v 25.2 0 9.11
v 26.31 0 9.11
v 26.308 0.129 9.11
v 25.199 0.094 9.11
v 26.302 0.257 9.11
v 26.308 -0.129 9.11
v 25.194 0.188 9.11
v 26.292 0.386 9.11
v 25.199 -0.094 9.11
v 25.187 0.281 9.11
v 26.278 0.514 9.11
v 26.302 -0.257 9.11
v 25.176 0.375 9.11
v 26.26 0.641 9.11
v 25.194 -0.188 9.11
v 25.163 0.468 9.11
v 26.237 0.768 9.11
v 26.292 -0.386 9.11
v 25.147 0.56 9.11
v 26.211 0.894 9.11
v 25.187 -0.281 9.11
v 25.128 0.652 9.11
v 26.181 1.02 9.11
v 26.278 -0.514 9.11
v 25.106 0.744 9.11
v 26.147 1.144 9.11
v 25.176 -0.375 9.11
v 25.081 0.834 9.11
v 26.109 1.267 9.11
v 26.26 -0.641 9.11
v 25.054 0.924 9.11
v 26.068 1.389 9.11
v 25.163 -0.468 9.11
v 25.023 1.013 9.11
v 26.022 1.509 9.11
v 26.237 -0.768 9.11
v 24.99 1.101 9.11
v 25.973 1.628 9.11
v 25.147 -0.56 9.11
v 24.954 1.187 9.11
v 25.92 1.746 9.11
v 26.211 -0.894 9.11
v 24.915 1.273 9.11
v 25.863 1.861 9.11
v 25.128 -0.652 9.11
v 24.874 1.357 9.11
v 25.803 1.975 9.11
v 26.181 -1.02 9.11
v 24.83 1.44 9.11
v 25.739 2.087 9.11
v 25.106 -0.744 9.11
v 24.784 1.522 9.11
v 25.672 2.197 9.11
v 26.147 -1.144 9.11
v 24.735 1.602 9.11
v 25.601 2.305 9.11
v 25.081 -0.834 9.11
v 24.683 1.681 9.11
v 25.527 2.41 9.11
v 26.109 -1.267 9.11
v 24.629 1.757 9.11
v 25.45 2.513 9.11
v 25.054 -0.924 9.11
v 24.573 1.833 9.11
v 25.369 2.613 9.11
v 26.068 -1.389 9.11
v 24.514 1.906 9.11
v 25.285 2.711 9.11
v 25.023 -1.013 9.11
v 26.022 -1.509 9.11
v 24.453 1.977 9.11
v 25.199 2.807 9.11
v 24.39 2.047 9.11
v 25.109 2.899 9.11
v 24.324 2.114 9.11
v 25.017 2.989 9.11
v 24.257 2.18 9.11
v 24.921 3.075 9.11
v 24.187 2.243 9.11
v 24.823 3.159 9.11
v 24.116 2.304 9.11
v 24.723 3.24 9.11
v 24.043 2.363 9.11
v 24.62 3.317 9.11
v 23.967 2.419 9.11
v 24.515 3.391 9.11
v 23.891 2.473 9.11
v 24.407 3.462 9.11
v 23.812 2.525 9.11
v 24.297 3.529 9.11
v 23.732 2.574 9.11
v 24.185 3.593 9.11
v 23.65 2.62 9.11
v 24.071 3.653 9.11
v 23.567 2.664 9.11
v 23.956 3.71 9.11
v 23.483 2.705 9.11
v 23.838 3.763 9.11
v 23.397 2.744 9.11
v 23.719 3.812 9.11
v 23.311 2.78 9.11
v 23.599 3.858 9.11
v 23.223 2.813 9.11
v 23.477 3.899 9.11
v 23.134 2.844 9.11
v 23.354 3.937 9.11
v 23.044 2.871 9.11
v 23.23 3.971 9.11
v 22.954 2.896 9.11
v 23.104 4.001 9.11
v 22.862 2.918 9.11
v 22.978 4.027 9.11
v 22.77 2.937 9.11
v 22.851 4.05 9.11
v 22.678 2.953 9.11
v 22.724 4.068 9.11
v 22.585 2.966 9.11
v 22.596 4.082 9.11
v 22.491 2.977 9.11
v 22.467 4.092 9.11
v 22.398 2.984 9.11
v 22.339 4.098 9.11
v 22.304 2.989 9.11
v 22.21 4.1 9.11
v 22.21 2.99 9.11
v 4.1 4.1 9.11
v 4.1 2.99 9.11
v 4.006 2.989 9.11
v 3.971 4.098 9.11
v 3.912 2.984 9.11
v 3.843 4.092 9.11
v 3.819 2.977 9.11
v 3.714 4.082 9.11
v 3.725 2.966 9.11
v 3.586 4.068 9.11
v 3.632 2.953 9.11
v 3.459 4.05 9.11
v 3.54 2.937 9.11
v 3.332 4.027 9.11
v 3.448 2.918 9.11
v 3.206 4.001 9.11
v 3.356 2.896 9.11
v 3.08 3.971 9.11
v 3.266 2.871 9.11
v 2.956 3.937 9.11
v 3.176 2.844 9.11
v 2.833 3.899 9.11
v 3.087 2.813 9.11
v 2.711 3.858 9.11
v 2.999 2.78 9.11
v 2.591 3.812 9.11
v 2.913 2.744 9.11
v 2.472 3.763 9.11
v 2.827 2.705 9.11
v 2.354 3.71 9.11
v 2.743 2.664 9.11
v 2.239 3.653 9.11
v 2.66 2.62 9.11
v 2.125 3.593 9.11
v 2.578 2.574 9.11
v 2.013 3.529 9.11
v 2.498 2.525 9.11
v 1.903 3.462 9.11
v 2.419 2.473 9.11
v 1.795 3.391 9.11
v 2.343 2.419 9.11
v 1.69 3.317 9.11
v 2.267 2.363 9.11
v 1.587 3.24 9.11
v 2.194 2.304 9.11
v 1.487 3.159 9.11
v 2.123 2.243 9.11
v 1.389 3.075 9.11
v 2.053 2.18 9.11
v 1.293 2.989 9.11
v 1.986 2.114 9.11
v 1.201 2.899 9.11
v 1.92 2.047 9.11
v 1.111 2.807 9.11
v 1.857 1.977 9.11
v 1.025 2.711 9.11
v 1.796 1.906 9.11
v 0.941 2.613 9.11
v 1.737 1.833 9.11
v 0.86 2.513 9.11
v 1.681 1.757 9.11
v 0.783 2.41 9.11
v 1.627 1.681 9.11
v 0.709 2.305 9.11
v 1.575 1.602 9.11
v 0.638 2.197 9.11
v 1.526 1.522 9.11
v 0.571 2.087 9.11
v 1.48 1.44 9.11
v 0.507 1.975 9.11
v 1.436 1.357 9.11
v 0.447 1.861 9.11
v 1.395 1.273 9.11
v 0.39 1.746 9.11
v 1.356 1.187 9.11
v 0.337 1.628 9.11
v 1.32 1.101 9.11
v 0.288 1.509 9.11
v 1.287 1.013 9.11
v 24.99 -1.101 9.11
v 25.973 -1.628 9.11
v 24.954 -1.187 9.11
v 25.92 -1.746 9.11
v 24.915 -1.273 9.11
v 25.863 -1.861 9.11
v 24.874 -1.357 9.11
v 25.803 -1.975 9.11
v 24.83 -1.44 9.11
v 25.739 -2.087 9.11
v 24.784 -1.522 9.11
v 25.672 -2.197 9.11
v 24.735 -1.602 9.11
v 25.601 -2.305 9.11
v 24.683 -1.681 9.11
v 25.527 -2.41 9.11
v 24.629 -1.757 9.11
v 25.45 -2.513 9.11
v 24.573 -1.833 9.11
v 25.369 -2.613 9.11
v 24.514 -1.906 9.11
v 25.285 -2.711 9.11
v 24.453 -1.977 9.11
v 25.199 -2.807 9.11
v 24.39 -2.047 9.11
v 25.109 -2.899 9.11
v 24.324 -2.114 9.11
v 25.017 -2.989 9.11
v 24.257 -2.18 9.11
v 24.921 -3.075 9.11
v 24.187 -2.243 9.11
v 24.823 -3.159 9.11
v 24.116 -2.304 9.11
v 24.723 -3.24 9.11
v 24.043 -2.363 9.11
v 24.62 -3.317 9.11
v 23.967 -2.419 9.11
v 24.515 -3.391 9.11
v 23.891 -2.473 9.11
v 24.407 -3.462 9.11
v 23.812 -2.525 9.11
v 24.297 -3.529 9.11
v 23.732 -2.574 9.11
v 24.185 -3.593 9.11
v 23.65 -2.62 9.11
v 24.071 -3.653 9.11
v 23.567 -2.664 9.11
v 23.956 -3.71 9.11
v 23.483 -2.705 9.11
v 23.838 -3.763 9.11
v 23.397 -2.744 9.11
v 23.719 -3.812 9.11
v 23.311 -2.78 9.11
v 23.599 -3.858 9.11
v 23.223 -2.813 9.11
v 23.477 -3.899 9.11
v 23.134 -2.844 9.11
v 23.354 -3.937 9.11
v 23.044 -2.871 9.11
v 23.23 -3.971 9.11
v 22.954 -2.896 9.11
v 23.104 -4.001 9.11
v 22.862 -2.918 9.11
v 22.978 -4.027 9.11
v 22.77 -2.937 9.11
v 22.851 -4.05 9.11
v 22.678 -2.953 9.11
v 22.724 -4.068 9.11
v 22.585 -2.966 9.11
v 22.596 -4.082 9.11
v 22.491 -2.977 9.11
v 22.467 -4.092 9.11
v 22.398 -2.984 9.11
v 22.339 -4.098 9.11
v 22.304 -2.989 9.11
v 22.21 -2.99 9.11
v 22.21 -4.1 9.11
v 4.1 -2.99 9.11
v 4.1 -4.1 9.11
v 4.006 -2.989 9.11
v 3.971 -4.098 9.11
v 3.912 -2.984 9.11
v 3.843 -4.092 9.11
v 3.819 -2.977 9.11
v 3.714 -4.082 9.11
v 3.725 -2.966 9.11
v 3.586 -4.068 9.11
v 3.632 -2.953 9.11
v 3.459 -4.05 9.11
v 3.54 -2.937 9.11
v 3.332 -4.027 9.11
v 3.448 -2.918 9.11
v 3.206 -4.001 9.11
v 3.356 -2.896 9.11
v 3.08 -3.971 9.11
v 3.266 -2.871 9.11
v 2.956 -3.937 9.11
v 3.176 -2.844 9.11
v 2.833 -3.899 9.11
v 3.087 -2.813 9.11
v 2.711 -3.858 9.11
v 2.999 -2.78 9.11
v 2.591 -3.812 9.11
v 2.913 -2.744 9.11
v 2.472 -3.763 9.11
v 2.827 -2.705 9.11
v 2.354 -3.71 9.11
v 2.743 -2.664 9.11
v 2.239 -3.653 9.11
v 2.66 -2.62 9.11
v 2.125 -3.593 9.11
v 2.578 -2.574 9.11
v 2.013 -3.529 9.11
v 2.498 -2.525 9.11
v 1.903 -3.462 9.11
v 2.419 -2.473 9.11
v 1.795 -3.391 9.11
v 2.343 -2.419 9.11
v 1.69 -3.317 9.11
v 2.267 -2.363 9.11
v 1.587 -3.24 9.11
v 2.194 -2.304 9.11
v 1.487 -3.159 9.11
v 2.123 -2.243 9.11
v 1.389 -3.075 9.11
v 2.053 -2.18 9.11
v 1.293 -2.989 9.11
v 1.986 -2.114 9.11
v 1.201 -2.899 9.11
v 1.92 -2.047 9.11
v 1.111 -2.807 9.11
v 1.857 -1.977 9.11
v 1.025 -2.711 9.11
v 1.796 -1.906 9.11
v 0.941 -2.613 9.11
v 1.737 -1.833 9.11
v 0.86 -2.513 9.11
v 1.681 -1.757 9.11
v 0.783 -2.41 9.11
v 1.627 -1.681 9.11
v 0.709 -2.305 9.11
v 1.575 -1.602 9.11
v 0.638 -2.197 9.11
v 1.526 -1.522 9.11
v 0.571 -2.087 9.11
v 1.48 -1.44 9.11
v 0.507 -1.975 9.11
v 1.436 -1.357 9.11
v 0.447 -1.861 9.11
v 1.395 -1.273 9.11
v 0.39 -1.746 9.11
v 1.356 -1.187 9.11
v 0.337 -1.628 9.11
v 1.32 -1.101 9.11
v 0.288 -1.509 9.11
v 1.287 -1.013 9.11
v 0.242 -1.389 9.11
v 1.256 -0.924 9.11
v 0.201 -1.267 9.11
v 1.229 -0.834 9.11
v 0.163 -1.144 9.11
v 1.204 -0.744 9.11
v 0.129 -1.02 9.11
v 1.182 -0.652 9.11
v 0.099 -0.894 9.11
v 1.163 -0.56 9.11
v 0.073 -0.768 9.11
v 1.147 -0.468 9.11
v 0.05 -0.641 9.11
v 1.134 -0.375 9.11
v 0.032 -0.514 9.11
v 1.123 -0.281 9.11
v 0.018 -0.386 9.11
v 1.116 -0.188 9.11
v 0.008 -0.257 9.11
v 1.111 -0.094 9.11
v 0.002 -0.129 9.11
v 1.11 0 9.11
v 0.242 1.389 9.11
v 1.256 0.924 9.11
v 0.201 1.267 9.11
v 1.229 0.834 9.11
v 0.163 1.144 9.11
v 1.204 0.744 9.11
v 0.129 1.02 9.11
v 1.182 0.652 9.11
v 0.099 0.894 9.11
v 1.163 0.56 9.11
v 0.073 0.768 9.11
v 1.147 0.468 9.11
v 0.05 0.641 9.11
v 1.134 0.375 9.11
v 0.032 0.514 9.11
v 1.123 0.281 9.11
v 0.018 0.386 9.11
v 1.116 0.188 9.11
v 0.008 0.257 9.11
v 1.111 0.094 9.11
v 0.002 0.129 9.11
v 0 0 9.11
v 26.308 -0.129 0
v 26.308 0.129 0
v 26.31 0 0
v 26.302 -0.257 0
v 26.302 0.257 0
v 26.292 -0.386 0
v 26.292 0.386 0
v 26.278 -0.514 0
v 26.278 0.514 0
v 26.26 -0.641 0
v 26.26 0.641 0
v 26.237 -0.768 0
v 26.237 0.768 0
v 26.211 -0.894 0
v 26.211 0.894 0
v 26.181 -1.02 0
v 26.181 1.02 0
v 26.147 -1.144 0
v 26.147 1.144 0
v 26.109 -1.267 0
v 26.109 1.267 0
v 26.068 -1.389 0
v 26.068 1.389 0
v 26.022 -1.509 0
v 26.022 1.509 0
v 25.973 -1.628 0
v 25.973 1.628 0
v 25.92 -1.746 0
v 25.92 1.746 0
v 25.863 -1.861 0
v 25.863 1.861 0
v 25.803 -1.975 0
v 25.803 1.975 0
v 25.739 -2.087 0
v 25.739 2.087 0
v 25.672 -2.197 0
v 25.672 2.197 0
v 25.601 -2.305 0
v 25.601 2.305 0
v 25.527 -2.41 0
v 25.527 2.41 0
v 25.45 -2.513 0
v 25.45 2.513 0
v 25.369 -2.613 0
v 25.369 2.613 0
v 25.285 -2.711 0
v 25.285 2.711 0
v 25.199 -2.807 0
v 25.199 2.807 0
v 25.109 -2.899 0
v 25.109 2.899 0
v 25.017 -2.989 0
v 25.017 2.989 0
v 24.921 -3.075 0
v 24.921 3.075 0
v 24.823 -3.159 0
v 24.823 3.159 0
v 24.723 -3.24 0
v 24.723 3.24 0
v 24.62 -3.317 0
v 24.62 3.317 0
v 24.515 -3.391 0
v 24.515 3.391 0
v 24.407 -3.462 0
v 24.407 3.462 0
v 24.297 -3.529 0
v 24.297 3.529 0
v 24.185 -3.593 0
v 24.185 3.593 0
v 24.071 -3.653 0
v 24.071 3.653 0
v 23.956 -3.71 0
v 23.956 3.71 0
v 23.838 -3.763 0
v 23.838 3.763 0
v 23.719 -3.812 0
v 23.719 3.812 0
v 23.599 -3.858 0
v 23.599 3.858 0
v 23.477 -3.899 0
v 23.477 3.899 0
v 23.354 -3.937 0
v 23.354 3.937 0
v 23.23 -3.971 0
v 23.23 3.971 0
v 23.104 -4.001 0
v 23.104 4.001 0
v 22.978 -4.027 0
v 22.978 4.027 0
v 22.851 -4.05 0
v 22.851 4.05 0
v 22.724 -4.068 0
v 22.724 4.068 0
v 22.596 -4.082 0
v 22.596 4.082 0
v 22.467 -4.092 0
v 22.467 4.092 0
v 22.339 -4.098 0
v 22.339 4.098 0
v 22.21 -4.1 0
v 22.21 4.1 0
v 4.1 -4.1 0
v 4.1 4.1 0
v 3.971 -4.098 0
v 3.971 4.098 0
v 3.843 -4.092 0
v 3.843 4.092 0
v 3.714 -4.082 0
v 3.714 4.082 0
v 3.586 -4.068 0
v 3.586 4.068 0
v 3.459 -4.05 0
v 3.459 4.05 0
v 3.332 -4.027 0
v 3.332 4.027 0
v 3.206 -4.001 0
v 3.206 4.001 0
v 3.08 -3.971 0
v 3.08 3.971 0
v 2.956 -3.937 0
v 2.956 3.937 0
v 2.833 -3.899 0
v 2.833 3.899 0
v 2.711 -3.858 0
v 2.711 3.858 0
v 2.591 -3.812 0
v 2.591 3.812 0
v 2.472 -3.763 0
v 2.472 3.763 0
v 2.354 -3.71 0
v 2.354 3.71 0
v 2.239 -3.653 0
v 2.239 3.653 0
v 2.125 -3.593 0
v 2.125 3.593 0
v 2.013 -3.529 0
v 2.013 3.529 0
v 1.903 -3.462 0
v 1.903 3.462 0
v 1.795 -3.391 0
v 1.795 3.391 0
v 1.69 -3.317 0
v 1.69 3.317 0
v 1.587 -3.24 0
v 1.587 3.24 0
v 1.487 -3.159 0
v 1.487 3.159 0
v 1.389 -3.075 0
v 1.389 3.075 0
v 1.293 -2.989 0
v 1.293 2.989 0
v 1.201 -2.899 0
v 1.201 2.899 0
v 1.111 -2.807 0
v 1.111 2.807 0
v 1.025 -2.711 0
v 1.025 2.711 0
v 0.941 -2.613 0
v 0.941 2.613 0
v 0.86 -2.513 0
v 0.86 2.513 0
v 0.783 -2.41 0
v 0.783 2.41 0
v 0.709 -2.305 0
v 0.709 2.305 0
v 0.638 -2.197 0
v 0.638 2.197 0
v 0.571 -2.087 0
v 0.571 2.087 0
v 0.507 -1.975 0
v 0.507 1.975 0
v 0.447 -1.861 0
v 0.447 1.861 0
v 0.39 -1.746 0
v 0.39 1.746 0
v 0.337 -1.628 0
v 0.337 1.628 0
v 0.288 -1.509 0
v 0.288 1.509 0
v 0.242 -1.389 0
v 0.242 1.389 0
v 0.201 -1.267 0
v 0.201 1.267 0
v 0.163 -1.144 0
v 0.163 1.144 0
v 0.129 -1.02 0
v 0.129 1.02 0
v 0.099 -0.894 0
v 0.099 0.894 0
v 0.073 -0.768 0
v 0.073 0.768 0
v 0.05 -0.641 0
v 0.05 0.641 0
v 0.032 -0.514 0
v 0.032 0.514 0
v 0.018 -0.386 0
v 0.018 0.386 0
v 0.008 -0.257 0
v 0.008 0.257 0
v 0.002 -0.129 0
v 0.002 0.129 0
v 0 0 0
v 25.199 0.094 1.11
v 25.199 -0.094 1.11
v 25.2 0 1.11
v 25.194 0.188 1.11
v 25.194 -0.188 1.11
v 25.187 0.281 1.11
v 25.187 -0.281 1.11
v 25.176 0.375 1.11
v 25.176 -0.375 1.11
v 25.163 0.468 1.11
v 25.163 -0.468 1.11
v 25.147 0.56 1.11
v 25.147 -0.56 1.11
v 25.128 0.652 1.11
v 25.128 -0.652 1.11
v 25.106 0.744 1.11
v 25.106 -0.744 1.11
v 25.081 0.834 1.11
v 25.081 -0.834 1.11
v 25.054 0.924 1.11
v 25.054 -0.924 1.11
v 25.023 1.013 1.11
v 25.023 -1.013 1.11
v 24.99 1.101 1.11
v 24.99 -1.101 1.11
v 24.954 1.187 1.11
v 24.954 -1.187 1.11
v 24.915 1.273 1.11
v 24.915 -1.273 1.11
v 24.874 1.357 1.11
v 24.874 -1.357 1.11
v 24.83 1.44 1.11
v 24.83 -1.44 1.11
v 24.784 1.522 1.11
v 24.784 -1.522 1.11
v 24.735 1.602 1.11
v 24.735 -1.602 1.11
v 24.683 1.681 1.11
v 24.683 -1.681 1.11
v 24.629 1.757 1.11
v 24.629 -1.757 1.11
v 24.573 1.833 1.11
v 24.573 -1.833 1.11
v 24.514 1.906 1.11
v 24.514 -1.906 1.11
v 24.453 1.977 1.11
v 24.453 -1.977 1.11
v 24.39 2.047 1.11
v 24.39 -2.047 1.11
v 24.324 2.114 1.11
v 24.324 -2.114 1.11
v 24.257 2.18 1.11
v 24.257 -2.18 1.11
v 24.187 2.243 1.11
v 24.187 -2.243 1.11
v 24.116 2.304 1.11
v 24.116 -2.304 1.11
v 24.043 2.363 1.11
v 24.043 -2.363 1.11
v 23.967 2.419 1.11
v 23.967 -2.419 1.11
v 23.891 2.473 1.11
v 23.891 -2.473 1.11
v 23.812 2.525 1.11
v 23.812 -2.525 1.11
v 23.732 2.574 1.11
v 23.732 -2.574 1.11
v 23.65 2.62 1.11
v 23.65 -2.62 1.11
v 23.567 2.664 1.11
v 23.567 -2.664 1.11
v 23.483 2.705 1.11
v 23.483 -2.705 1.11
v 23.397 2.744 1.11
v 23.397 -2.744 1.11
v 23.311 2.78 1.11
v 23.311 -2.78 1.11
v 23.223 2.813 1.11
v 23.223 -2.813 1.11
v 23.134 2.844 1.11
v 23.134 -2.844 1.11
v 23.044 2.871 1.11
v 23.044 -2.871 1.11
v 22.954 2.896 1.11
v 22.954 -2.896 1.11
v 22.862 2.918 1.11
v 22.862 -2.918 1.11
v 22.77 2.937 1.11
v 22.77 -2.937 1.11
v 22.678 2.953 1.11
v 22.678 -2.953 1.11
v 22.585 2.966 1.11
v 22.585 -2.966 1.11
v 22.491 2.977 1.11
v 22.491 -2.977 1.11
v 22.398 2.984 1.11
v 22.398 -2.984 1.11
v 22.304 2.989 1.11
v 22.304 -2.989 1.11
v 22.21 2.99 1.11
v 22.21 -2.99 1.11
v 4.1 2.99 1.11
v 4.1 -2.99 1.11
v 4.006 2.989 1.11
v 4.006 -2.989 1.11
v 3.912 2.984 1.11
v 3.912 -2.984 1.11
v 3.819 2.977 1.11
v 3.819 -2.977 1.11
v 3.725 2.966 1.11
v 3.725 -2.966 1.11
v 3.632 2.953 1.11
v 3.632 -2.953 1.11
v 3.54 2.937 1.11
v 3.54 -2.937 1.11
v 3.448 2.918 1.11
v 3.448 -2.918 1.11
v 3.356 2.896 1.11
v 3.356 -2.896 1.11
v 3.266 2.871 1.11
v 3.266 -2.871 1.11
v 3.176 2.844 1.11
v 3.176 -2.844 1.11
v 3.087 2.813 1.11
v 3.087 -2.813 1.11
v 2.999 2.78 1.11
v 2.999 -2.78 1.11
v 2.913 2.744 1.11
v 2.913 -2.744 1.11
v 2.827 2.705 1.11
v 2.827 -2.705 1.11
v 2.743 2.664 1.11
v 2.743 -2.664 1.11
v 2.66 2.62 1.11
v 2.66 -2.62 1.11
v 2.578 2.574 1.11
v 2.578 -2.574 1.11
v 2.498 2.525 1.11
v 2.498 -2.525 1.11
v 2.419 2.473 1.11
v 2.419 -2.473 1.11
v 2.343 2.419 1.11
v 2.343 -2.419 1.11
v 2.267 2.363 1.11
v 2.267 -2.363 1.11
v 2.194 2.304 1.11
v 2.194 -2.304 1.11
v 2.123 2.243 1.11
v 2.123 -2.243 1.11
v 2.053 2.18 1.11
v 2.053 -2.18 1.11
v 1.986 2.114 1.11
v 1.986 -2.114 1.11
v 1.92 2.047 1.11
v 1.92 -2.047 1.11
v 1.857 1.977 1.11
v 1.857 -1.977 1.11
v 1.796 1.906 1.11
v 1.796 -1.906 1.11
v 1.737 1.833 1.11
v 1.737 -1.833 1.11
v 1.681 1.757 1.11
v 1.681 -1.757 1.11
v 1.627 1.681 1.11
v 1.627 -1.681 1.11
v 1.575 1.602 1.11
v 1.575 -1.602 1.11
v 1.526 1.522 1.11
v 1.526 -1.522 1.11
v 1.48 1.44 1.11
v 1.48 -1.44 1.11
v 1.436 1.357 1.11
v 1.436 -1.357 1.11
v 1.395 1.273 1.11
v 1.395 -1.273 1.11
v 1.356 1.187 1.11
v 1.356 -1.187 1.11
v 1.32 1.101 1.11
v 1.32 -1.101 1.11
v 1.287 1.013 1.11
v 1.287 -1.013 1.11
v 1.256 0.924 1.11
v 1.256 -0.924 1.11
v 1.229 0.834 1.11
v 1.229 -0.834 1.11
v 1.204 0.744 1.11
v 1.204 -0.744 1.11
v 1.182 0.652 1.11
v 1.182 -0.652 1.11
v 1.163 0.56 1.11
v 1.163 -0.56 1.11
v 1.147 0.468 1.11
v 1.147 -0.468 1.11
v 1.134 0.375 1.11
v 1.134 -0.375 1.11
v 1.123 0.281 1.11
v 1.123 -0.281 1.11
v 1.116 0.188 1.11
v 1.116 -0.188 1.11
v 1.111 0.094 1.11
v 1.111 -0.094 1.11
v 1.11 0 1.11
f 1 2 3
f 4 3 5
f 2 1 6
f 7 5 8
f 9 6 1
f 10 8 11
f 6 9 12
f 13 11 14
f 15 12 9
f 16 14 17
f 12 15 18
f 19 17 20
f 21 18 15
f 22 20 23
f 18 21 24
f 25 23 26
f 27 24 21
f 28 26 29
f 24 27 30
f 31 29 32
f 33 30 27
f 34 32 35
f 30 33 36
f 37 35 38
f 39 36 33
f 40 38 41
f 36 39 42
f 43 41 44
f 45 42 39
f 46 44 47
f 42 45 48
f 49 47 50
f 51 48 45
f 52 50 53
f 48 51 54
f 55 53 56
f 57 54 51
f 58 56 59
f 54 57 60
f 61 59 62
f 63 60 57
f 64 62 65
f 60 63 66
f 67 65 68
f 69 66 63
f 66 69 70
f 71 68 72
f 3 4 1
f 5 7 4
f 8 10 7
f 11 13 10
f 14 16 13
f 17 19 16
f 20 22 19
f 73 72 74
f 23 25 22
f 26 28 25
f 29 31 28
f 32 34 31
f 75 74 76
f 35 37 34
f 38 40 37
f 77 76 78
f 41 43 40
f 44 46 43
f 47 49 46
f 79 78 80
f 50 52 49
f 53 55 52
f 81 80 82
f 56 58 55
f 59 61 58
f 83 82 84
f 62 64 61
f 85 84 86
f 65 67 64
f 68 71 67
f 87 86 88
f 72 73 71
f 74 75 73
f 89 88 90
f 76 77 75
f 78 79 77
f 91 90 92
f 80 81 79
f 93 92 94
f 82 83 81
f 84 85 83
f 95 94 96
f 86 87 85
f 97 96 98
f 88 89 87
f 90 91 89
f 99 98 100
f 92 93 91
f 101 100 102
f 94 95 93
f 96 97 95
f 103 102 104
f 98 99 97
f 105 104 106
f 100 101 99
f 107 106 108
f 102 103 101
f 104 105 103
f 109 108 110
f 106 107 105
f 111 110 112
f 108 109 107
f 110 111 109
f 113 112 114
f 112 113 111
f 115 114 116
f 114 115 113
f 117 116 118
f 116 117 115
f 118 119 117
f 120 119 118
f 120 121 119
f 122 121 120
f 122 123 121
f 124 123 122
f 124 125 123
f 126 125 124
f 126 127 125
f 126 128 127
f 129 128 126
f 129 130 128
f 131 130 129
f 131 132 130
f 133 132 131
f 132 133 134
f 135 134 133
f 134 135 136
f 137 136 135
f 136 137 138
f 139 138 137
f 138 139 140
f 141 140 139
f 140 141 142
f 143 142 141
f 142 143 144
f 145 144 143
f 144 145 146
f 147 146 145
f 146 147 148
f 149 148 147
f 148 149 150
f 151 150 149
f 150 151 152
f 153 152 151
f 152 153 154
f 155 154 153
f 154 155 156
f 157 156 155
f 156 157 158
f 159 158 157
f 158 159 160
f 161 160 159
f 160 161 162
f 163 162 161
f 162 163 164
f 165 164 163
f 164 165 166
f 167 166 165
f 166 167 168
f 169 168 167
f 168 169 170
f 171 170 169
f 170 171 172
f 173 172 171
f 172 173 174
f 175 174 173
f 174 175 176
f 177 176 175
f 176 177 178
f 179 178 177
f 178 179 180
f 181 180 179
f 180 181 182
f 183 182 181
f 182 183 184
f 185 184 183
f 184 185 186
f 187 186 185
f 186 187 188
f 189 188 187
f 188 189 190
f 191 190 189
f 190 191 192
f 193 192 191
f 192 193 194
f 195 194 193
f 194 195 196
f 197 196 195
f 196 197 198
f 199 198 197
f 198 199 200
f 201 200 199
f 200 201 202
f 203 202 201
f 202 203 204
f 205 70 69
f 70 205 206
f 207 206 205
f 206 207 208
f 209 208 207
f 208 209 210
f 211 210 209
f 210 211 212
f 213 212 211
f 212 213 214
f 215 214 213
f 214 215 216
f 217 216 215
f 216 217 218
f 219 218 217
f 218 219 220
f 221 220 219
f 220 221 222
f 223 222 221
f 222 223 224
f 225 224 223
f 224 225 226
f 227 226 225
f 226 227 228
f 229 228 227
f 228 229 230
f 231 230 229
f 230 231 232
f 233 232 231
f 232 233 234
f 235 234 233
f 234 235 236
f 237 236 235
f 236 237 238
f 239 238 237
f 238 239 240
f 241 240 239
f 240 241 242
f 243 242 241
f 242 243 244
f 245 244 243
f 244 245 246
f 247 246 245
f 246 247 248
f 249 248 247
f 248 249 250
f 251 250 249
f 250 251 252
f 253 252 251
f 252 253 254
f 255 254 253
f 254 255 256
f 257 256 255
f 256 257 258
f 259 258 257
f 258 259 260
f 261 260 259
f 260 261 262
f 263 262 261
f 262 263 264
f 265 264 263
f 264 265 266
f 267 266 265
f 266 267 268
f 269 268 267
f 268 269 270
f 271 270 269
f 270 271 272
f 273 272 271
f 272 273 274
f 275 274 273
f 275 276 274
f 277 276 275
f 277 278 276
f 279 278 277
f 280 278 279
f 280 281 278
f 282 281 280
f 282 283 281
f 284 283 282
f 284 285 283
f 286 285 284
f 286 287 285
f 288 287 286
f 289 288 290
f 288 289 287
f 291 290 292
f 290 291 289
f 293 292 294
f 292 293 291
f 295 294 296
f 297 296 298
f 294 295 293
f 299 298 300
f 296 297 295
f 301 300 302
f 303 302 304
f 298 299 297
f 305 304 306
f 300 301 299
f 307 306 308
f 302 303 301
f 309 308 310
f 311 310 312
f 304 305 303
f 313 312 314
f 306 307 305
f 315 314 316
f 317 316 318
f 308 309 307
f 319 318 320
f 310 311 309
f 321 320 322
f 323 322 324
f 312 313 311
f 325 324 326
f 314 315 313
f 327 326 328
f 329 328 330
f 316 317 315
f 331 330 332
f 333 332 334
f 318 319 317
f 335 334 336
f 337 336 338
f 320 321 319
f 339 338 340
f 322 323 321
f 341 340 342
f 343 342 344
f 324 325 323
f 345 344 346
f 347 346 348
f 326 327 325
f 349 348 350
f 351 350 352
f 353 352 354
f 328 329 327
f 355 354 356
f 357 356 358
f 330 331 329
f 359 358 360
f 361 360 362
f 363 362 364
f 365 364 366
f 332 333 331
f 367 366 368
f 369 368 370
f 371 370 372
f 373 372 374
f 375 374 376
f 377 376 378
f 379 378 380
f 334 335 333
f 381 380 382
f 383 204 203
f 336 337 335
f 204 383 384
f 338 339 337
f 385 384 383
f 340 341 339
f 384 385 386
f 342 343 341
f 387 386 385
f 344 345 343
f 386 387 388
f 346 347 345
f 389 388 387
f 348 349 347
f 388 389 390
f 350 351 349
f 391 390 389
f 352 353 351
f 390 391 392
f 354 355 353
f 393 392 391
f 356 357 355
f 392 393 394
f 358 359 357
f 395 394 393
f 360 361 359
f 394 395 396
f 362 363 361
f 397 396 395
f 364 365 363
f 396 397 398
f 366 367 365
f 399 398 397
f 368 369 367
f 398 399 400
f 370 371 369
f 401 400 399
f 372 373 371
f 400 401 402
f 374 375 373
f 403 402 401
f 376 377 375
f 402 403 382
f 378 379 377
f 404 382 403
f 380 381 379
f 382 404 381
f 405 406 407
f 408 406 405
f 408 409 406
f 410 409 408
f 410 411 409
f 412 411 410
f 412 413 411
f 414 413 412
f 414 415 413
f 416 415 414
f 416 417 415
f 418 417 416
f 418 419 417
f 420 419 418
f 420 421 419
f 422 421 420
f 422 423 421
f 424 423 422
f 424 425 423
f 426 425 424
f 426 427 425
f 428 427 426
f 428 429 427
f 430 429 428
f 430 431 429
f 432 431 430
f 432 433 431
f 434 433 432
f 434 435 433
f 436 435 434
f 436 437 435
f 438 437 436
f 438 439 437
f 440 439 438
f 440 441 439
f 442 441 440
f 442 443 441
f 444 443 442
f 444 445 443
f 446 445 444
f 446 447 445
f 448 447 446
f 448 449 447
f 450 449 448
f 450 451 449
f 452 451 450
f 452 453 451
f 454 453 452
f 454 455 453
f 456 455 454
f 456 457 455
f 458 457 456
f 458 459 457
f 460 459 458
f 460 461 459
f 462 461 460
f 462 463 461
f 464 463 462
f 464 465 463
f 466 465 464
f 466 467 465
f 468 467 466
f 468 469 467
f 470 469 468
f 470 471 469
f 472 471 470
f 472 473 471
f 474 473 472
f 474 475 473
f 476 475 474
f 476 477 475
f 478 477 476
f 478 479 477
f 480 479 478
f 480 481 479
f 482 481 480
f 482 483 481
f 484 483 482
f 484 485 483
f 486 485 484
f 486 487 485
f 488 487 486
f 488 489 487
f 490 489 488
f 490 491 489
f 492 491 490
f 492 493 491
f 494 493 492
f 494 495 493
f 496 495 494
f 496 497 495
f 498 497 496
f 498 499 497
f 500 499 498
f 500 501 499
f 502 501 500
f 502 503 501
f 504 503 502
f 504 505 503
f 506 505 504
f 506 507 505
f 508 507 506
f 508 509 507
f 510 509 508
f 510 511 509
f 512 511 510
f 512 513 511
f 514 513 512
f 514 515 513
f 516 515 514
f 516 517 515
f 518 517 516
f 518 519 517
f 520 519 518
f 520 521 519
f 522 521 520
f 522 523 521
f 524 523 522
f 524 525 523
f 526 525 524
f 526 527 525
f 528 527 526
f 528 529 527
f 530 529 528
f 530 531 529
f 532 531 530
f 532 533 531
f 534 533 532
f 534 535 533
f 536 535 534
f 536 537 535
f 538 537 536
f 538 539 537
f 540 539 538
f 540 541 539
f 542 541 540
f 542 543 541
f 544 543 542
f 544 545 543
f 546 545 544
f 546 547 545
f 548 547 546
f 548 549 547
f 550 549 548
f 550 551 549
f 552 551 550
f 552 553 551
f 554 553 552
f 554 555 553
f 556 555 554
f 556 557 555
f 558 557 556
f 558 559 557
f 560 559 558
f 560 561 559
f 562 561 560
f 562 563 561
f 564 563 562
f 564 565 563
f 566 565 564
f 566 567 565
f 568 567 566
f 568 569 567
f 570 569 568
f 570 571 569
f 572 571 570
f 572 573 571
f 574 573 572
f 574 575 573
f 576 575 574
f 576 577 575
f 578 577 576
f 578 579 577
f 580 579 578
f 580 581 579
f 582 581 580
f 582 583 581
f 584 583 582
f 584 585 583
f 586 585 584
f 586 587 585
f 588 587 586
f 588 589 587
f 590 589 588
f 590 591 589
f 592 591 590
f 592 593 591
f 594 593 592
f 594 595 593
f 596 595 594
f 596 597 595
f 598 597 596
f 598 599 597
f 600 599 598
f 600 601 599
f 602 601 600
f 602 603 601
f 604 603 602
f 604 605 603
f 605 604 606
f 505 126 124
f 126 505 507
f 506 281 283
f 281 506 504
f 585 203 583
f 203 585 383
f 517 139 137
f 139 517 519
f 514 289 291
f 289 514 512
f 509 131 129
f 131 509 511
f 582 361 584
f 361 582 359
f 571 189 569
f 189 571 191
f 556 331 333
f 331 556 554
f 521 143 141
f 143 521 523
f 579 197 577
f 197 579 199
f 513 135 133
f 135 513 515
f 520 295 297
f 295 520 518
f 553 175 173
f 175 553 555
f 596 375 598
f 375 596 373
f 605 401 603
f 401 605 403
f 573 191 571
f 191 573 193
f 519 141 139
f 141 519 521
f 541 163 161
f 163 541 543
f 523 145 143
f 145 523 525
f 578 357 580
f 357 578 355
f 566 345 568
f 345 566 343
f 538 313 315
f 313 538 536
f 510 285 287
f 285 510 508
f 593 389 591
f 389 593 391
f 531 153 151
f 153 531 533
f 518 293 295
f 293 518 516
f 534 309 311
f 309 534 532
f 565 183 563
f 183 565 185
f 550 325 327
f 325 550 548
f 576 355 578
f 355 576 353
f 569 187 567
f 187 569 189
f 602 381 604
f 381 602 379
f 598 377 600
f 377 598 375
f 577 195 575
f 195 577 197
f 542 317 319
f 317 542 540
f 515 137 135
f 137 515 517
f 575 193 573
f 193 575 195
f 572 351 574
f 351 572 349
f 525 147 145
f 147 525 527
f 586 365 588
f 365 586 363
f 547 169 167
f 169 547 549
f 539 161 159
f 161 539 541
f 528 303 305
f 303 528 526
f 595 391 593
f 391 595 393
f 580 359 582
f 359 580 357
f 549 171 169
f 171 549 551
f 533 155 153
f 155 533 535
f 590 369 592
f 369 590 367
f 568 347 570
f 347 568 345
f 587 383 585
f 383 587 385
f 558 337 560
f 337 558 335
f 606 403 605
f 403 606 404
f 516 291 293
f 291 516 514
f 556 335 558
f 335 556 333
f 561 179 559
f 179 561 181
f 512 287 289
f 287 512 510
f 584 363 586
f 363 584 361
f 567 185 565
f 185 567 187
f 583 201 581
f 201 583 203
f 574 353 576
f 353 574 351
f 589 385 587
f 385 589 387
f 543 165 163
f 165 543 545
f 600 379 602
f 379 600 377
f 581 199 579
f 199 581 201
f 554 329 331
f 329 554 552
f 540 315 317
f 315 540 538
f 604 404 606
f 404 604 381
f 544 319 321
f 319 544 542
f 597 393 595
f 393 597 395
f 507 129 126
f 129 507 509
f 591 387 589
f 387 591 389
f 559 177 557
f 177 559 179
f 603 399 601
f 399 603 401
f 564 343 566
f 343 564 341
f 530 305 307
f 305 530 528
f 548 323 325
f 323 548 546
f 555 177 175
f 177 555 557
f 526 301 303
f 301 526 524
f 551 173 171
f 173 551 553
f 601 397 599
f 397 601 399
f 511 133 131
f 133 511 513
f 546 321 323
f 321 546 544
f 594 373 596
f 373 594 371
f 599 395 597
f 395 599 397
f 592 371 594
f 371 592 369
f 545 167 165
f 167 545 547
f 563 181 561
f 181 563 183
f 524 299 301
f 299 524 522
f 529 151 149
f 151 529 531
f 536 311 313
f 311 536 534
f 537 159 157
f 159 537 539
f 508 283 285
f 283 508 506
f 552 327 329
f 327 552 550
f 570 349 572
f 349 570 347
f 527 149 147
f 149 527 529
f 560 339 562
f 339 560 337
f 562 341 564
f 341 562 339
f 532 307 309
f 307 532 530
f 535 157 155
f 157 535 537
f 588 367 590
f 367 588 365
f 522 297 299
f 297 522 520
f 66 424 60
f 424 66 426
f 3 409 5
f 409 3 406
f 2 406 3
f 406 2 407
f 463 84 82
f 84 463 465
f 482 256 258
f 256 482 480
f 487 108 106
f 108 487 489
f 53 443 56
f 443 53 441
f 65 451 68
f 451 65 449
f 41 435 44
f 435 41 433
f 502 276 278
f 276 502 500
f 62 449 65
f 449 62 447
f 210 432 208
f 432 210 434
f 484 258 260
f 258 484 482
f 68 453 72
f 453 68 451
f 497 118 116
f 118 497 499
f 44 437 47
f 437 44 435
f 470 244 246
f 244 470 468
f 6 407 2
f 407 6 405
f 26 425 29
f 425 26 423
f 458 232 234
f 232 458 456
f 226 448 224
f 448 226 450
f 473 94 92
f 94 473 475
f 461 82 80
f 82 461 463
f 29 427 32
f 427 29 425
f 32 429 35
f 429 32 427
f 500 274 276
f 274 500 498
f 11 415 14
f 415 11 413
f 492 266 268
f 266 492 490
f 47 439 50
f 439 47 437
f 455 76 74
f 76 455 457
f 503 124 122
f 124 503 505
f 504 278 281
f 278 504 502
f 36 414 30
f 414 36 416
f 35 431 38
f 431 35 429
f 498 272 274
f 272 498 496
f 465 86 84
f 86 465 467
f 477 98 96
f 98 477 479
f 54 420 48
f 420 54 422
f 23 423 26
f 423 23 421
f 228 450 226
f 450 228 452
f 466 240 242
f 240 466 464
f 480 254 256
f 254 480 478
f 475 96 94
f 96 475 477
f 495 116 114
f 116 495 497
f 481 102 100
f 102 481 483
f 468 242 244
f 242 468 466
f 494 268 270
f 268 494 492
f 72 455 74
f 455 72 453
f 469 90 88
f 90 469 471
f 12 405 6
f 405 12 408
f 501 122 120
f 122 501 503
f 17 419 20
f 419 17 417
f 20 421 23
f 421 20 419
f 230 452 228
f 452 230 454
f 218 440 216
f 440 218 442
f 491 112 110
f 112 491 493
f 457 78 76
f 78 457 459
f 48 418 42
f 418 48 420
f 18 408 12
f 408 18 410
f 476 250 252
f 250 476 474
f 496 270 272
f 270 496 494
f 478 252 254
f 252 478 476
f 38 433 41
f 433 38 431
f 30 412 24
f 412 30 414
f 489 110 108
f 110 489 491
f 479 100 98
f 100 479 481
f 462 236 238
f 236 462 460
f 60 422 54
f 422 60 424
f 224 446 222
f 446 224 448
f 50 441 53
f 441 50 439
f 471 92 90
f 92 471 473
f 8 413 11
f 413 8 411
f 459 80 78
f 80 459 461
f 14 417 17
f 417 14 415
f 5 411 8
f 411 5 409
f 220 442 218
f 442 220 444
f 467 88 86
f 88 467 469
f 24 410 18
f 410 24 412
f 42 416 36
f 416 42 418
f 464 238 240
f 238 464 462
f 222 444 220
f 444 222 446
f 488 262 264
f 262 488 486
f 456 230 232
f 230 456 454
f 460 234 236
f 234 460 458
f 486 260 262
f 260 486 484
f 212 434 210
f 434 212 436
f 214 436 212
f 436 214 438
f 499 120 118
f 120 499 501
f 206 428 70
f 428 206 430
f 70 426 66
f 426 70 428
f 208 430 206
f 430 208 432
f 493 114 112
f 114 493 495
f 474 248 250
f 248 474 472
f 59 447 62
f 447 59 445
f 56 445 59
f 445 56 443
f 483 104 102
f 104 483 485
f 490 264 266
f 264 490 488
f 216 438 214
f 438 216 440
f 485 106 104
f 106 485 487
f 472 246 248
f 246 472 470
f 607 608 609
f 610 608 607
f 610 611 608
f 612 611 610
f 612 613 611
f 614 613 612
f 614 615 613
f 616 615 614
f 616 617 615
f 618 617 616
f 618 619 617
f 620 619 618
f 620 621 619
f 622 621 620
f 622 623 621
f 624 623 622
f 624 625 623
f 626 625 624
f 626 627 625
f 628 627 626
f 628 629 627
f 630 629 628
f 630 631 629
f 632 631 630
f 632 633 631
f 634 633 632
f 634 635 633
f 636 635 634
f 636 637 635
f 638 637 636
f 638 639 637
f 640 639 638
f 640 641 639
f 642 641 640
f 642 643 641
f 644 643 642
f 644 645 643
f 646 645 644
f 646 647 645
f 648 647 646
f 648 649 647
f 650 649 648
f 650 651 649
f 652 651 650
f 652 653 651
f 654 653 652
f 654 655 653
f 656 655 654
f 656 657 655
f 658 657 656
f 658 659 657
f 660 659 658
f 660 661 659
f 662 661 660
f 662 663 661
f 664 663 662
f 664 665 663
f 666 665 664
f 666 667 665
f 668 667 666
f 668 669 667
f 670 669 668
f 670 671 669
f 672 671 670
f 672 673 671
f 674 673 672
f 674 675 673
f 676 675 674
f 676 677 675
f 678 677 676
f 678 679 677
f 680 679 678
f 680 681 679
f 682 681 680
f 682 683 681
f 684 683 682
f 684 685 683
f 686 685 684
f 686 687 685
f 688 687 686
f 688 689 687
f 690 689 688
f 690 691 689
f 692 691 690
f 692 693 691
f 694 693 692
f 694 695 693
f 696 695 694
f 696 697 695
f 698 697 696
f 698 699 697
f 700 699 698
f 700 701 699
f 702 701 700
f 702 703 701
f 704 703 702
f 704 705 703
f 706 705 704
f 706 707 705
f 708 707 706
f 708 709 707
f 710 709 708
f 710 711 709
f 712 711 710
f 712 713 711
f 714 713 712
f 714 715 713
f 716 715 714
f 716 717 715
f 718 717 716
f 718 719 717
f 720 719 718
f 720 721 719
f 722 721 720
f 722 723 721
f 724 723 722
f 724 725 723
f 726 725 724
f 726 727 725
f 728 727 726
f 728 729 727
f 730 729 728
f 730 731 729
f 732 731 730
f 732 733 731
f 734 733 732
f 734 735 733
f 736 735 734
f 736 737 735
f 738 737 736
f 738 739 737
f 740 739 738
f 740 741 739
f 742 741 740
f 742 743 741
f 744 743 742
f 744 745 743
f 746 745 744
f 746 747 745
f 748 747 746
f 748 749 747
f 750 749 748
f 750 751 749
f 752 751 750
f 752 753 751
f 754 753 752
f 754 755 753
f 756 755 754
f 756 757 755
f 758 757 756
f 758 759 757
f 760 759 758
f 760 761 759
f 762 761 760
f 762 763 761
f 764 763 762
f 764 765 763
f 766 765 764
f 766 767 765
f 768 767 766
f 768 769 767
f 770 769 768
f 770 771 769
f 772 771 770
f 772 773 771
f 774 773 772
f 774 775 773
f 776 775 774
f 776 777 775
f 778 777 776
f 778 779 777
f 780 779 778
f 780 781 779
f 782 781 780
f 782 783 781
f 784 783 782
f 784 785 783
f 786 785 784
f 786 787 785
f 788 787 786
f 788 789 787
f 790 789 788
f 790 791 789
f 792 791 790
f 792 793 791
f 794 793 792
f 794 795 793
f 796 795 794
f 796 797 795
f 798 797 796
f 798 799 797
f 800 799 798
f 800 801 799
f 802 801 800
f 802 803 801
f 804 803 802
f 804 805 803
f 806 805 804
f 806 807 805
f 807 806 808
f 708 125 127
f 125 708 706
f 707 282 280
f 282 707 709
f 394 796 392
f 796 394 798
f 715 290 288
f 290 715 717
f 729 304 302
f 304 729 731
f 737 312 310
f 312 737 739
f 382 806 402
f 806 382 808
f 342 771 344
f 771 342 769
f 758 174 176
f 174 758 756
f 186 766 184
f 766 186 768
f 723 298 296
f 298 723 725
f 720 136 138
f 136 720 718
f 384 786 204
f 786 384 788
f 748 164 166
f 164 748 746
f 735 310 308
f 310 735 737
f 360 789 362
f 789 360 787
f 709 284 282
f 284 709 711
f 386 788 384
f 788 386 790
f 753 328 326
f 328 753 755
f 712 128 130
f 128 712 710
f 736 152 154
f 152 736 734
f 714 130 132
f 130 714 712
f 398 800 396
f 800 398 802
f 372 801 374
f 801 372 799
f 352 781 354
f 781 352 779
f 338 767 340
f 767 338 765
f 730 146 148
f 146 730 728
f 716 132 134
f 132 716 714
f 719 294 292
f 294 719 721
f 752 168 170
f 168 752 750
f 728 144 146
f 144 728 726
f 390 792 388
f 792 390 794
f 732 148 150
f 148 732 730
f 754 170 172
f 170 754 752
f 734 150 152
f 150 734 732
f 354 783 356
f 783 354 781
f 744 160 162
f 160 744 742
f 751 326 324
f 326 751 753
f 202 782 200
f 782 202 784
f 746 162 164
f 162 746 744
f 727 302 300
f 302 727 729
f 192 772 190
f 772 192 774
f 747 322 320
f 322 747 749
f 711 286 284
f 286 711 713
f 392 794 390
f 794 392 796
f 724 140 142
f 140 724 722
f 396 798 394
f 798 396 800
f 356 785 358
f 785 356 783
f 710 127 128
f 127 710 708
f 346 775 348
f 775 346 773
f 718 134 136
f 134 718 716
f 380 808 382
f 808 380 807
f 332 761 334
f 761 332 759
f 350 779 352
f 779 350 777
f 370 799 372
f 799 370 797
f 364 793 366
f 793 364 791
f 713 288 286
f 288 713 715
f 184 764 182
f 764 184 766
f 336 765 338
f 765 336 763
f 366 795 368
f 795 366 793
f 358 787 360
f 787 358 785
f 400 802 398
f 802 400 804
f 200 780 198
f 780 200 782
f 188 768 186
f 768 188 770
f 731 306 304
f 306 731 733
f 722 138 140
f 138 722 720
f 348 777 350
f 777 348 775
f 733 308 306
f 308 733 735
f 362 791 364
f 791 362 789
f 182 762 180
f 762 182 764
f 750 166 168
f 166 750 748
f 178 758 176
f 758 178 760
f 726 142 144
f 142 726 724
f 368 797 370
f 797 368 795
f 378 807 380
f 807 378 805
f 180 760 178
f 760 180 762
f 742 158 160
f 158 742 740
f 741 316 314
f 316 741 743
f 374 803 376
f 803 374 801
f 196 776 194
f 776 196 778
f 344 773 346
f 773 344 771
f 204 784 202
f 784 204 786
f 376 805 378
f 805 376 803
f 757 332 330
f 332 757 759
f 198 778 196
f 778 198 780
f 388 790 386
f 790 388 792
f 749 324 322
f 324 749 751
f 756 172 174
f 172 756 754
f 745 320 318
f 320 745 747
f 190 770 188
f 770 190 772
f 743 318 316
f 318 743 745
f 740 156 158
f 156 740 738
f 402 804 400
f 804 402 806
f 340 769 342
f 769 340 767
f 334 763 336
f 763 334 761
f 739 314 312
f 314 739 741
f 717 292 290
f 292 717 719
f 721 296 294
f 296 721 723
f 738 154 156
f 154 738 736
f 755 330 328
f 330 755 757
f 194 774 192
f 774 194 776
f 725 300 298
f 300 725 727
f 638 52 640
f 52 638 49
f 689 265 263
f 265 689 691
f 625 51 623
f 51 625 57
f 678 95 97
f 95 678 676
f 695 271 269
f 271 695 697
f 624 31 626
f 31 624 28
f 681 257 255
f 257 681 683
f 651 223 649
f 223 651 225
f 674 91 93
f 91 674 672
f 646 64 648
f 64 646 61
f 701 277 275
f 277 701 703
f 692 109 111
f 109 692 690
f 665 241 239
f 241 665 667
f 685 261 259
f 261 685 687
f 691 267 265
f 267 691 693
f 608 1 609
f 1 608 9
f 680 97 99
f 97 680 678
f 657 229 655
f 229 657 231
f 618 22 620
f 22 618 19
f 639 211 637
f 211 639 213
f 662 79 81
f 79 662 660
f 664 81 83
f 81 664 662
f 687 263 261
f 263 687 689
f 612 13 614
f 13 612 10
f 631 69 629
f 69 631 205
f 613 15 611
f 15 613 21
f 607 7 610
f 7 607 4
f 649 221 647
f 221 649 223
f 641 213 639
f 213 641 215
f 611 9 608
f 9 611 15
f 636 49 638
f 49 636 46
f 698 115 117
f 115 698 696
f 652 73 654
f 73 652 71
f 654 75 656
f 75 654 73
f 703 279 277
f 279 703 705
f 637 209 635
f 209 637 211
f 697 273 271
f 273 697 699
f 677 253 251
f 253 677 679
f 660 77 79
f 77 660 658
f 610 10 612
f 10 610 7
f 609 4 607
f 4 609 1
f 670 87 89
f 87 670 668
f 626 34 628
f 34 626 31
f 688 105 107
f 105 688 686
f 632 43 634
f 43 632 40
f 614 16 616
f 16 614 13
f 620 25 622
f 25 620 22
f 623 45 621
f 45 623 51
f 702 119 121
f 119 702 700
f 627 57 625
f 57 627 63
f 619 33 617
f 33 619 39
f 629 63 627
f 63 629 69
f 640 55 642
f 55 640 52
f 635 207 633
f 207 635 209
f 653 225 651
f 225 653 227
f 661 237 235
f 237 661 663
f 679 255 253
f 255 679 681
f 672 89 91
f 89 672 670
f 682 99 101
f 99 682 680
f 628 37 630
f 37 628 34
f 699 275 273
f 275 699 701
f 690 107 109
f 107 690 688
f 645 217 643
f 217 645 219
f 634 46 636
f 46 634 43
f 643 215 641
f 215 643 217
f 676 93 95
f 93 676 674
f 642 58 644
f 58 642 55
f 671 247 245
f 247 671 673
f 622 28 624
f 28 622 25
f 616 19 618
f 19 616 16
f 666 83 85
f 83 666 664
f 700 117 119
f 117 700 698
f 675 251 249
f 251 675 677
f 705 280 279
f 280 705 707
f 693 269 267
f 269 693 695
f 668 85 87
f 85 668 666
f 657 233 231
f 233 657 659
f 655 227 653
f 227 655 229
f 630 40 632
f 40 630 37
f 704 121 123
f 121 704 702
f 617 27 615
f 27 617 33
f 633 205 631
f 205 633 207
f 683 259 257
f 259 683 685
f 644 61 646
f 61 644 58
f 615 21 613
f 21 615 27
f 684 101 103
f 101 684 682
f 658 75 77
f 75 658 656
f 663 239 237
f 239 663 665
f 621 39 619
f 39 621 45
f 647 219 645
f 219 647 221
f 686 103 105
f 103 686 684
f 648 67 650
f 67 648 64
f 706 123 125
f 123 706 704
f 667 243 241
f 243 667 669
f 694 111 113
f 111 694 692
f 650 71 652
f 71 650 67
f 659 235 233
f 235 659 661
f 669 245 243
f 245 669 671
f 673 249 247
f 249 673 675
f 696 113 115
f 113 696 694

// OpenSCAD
r = 4.1;
w = 25.2;
s = 1.11;
h = 9.11;

difference() {
    union()
    { 
        translate([r, -r,0]) cube([w-2*r+s, 2*r, h]);
        translate([r,0,0]) kraj(r);
        translate([w-r+s,0,0]) kraj(r);
    }
    
    union()
    {   
        translate([0,0,s]) {
    
            translate([r, -r+s,0]) cube([w-2*r+s, (2*r)-2*s, h]);
            translate([r,0,0]) kraj(r-s);  
            translate([w-r+s,0,0]) kraj(r-s);
        }
    }
    
}

module kraj(r = 4) {
    
    cylinder(h, r, r, $fn=200);
}
